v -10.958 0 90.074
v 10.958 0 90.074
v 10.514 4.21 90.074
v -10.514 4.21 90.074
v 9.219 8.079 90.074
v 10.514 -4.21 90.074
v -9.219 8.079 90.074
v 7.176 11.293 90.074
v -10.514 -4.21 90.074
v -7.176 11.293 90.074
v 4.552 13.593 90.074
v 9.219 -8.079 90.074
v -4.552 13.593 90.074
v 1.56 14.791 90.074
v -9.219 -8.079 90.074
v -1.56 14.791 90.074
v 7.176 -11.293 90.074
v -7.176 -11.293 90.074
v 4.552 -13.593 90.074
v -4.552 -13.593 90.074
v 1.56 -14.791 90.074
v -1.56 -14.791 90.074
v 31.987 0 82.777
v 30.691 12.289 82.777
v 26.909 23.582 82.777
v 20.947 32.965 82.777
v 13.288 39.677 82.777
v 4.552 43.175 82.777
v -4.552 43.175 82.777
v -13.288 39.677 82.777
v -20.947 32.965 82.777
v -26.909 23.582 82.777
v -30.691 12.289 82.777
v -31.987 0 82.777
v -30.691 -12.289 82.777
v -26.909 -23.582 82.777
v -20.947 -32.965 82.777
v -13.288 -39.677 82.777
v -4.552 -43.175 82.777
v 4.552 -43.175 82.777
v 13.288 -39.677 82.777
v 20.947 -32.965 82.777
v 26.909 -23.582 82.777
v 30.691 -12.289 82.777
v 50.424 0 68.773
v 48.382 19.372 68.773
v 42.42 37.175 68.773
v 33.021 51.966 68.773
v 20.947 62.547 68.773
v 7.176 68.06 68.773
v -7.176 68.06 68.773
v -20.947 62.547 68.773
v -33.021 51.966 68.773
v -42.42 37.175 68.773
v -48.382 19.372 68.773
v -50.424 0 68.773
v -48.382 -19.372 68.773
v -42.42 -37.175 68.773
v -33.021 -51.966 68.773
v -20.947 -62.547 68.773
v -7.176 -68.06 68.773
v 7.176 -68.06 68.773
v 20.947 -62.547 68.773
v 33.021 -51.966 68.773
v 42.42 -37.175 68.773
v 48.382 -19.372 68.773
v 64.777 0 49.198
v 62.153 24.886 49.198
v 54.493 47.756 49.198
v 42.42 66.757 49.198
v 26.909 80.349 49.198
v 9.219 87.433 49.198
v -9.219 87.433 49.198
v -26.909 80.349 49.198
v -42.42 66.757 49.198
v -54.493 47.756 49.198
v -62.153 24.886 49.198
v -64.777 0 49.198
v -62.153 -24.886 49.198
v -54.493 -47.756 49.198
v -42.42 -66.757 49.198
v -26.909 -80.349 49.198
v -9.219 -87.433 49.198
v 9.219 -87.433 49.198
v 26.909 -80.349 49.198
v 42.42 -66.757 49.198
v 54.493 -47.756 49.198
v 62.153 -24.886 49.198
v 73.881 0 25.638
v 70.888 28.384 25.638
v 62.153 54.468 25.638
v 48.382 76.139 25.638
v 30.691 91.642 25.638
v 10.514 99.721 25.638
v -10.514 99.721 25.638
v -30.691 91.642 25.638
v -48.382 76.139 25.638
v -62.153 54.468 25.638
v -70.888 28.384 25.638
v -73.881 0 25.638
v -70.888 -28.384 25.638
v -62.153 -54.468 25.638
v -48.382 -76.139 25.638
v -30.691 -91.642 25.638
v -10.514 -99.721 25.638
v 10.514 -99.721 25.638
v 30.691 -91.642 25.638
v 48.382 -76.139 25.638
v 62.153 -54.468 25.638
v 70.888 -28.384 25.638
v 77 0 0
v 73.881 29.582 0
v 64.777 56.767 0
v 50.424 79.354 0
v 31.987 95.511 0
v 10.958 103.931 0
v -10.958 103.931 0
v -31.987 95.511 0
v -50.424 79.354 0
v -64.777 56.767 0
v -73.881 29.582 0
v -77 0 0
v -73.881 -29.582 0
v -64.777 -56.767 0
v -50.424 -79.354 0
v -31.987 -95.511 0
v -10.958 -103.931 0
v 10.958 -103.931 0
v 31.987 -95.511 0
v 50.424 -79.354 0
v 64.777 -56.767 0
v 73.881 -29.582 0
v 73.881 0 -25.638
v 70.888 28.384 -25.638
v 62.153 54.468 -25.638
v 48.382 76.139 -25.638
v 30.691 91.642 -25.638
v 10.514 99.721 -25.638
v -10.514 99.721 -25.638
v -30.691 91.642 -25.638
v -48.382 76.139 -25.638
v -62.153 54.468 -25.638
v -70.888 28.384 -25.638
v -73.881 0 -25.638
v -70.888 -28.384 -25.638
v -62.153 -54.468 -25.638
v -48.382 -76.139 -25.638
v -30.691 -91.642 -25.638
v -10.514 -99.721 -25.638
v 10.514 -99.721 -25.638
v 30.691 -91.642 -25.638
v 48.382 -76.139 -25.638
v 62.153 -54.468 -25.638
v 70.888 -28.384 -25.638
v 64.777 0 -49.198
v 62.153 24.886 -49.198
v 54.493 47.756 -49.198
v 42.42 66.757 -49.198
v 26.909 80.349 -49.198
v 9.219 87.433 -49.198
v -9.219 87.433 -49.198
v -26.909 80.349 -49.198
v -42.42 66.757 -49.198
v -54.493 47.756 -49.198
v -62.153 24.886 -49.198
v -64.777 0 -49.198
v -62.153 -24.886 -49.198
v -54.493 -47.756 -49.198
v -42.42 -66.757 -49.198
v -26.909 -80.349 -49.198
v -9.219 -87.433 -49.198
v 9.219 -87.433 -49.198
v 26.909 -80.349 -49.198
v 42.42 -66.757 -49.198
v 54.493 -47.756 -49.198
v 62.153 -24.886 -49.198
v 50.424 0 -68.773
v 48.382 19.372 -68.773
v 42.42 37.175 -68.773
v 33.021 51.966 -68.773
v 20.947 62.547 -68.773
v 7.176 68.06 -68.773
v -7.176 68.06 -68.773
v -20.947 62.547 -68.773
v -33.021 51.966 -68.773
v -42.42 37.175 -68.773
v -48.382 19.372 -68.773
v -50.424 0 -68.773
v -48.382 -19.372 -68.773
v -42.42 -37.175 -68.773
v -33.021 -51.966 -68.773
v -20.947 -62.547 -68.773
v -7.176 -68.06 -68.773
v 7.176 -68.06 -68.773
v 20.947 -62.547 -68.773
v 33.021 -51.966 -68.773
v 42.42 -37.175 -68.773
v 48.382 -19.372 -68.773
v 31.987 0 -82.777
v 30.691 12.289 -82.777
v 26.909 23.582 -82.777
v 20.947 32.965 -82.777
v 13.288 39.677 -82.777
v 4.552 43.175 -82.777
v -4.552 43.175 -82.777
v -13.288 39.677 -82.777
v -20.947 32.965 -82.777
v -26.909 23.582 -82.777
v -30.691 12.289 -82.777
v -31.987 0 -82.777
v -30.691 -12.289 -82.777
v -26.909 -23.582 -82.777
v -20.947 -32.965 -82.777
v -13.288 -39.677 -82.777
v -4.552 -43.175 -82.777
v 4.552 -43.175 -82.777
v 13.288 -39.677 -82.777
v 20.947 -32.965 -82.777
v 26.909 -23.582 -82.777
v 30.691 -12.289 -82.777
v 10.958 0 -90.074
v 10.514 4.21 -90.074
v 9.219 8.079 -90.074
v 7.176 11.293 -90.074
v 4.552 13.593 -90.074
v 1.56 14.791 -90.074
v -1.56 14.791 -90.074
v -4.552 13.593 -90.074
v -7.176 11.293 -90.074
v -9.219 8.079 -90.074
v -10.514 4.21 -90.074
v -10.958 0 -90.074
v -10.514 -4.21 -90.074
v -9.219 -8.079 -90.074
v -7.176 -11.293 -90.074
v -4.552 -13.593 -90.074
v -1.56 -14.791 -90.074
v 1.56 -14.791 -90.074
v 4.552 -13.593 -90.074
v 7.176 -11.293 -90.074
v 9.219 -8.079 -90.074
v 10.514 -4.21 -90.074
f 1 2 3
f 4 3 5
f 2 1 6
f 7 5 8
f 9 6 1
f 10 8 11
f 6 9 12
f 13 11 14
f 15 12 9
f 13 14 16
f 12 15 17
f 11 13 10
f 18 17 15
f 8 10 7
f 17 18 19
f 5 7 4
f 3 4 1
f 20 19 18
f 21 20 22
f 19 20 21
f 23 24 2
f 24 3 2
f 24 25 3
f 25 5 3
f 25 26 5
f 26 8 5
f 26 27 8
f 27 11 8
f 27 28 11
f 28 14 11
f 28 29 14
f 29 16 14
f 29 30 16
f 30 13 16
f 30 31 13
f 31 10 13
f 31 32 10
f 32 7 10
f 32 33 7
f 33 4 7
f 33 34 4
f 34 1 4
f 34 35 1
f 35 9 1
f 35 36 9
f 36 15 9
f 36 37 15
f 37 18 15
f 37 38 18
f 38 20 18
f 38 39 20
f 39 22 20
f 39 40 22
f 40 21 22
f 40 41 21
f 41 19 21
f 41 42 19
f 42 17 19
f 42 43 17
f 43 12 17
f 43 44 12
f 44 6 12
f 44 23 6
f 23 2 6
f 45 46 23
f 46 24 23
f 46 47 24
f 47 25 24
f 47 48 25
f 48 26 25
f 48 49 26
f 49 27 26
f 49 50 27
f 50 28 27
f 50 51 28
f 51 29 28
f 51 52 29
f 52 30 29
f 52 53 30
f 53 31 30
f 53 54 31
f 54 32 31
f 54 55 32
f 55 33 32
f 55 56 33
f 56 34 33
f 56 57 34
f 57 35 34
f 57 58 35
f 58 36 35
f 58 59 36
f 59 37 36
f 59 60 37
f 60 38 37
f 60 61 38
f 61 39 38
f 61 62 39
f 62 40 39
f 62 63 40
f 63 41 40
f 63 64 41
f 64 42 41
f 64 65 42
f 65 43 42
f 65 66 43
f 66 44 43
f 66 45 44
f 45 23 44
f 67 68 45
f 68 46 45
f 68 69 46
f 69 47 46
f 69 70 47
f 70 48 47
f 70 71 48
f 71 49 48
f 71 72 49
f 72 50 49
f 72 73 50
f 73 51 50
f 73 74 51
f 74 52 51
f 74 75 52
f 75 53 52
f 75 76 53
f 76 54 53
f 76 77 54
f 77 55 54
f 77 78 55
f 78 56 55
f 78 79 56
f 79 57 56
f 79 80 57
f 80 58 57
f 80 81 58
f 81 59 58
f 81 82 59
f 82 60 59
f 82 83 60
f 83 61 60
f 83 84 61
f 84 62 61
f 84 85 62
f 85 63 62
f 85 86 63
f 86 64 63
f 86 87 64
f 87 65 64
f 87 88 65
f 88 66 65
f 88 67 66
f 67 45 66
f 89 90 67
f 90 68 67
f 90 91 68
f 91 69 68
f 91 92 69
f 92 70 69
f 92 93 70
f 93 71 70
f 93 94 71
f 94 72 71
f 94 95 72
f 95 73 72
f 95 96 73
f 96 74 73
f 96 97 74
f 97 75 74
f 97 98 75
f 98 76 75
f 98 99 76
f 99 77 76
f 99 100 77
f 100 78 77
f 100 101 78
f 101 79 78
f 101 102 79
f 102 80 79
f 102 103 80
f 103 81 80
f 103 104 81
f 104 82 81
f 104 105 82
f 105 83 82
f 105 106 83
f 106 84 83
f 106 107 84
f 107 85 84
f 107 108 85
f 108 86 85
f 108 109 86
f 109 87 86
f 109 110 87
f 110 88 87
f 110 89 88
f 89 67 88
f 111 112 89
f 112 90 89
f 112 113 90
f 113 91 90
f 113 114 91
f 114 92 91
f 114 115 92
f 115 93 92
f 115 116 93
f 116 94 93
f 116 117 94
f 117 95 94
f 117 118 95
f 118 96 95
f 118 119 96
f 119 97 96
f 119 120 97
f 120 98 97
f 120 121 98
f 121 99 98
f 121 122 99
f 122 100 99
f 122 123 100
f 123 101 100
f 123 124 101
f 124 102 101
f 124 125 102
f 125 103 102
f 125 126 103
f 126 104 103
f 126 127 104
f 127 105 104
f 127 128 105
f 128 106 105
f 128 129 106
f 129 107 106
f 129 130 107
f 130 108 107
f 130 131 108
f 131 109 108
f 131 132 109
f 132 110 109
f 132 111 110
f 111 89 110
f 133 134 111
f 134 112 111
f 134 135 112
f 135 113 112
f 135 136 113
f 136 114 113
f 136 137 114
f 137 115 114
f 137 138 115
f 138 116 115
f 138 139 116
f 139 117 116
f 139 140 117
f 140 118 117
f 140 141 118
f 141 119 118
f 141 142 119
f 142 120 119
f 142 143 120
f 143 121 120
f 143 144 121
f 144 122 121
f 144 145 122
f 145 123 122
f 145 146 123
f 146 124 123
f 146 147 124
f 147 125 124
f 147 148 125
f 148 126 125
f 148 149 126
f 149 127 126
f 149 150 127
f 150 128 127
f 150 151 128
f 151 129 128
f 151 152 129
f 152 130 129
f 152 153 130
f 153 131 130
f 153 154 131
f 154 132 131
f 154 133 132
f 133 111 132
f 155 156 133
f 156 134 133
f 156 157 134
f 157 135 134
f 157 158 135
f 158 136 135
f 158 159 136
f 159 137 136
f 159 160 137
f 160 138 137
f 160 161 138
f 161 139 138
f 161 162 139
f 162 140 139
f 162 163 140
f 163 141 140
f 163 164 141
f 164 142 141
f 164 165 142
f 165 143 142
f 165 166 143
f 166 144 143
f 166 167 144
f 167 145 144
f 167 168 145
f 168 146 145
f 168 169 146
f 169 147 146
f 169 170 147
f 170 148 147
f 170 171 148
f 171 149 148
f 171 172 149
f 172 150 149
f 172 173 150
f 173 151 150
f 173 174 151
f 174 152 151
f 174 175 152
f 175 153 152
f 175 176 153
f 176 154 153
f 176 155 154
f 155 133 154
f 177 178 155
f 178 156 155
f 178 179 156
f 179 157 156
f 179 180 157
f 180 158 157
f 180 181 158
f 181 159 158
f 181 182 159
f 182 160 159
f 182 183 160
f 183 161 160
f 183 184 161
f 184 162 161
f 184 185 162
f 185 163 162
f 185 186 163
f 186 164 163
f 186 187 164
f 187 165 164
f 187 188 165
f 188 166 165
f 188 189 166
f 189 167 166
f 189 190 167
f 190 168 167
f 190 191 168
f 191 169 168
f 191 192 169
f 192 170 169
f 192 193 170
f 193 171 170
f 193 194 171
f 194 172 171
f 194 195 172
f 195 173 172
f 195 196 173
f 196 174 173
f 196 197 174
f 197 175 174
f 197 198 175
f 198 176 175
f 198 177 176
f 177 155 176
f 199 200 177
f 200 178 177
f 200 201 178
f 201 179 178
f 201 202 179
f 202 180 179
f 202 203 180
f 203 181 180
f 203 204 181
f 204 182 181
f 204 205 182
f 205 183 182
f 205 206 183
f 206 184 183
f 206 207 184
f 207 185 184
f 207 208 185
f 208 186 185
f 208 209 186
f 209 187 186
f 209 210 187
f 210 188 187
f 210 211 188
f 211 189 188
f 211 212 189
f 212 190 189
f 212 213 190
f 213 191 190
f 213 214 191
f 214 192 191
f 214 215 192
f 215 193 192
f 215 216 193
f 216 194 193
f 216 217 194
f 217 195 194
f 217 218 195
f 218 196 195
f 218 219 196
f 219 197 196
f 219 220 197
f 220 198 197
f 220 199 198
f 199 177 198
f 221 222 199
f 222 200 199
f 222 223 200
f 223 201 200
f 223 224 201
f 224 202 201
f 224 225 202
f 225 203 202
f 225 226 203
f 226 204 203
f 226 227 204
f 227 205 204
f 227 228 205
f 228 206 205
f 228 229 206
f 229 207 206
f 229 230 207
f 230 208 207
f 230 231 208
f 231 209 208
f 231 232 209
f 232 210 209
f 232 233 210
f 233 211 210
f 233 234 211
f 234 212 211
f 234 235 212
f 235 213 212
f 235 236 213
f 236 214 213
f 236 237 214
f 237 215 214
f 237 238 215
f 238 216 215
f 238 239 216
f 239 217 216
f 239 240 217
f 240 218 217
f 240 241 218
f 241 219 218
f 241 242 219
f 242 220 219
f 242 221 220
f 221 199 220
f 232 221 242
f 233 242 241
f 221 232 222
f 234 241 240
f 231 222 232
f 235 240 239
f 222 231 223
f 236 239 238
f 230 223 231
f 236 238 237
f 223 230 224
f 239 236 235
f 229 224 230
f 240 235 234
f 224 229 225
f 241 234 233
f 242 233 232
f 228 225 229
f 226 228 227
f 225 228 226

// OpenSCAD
// Generated by SolidPython 1.0.1 on 2020-07-29 00:46:50


scale(v = [11, 15, 13]) {
	sphere(r = 7);
}
/***********************************************
*********      SolidPython code:      **********
************************************************
 
# import packages: SolidPython
from solid import *
from solid.utils import *
from itertools import chain, combinations, permutations


class Resize:

    def __init__(self, scad_file):
        self.scad_file = scad_file
        #self.scad_file = import_scad(scad_file)
        # cone/cylinder param:
        self.r1 = 0
        self.r2 = 0
        self.h = 0
        # rectangular prism param:
        self.w = 0
        self.l = 0
        # ellipse param:
        self.r = 0

    # import OpenScad code (file name corresponds to shape)


    # classify shape + parameters
    def assign(self, param1, param2, param3):
        if self.scad_file == 'cone.scad':
            self.r1 = param1
            self.r2 = param2
            self.h = param3
        elif self.scad_file == 'cylinder.scad':
            self.r1 = param1
            self.r2 = param2
            self.h = param3
        elif self.scad_file == 'rectangularPrism.scad':
            self.h = param1
            self.l = param2
            self.w = param3
        else:
            self.r = param1
            self.h = param2

    # resize parameters
    def iterate(self):
        x = range(3, 20, 2)
        i = 1
        if self.scad_file == 'cone.scad':
            tempList = list(permutations(x, 2))
            for temp in tempList:
                param1 = temp[0]
                param2 = temp[1]
                filepath = 'produced_scad_files/' + 'cone' + str(param1) + '_' + str(param2) + '_' + '.scad'
                scad_render_to_file(cylinder(h=param1, r1=param2, r2=0), filepath)

        elif self.scad_file == 'cylinder.scad':
            tempList = list(permutations(x, 3))
            for temp in tempList:
                param1 = temp[0]
                param2 = temp[1]
                filepath = 'produced_scad_files/' + 'cylinder' + str(param1) + '_' + str(param2) + '_' + '.scad'
                scad_render_to_file(cylinder(h=param1, r1=param2, r2=param2), filepath)

        elif self.scad_file == 'rectangularPrism.scad':
            tempList = list(permutations(x, 3))
            for temp in tempList:
                param1 = temp[0]
                param2 = temp[1]
                param3 = temp[2]
                filepath = 'produced_scad_files/' + 'rectangularPrism' + str(param1) + '_' + str(param2) + '_' + str(
                    param3) + '.scad'
                scad_render_to_file(cube(size=(param1, param2, param3)), filepath)

        elif self.scad_file == 'ellipse.scad':
            tempList = list(permutations(x, 4))
            for temp in tempList:
                param1 = temp[0]
                param2 = temp[1]
                param3 = temp[2]
                param4 = temp[3]
                filepath = 'produced_scad_files/' + 'ellipse' + str(param1) + '_' + str(param2) + '_' + str(param3) + '_' + str(param4) + '.scad'
                scad_render_to_file(scale([param1, param2, param3])(sphere(r=param4)), filepath)

    def render_to_scadfile(self):
        scad_render_to_file(scad, 'example.scad') 
 
************************************************/
